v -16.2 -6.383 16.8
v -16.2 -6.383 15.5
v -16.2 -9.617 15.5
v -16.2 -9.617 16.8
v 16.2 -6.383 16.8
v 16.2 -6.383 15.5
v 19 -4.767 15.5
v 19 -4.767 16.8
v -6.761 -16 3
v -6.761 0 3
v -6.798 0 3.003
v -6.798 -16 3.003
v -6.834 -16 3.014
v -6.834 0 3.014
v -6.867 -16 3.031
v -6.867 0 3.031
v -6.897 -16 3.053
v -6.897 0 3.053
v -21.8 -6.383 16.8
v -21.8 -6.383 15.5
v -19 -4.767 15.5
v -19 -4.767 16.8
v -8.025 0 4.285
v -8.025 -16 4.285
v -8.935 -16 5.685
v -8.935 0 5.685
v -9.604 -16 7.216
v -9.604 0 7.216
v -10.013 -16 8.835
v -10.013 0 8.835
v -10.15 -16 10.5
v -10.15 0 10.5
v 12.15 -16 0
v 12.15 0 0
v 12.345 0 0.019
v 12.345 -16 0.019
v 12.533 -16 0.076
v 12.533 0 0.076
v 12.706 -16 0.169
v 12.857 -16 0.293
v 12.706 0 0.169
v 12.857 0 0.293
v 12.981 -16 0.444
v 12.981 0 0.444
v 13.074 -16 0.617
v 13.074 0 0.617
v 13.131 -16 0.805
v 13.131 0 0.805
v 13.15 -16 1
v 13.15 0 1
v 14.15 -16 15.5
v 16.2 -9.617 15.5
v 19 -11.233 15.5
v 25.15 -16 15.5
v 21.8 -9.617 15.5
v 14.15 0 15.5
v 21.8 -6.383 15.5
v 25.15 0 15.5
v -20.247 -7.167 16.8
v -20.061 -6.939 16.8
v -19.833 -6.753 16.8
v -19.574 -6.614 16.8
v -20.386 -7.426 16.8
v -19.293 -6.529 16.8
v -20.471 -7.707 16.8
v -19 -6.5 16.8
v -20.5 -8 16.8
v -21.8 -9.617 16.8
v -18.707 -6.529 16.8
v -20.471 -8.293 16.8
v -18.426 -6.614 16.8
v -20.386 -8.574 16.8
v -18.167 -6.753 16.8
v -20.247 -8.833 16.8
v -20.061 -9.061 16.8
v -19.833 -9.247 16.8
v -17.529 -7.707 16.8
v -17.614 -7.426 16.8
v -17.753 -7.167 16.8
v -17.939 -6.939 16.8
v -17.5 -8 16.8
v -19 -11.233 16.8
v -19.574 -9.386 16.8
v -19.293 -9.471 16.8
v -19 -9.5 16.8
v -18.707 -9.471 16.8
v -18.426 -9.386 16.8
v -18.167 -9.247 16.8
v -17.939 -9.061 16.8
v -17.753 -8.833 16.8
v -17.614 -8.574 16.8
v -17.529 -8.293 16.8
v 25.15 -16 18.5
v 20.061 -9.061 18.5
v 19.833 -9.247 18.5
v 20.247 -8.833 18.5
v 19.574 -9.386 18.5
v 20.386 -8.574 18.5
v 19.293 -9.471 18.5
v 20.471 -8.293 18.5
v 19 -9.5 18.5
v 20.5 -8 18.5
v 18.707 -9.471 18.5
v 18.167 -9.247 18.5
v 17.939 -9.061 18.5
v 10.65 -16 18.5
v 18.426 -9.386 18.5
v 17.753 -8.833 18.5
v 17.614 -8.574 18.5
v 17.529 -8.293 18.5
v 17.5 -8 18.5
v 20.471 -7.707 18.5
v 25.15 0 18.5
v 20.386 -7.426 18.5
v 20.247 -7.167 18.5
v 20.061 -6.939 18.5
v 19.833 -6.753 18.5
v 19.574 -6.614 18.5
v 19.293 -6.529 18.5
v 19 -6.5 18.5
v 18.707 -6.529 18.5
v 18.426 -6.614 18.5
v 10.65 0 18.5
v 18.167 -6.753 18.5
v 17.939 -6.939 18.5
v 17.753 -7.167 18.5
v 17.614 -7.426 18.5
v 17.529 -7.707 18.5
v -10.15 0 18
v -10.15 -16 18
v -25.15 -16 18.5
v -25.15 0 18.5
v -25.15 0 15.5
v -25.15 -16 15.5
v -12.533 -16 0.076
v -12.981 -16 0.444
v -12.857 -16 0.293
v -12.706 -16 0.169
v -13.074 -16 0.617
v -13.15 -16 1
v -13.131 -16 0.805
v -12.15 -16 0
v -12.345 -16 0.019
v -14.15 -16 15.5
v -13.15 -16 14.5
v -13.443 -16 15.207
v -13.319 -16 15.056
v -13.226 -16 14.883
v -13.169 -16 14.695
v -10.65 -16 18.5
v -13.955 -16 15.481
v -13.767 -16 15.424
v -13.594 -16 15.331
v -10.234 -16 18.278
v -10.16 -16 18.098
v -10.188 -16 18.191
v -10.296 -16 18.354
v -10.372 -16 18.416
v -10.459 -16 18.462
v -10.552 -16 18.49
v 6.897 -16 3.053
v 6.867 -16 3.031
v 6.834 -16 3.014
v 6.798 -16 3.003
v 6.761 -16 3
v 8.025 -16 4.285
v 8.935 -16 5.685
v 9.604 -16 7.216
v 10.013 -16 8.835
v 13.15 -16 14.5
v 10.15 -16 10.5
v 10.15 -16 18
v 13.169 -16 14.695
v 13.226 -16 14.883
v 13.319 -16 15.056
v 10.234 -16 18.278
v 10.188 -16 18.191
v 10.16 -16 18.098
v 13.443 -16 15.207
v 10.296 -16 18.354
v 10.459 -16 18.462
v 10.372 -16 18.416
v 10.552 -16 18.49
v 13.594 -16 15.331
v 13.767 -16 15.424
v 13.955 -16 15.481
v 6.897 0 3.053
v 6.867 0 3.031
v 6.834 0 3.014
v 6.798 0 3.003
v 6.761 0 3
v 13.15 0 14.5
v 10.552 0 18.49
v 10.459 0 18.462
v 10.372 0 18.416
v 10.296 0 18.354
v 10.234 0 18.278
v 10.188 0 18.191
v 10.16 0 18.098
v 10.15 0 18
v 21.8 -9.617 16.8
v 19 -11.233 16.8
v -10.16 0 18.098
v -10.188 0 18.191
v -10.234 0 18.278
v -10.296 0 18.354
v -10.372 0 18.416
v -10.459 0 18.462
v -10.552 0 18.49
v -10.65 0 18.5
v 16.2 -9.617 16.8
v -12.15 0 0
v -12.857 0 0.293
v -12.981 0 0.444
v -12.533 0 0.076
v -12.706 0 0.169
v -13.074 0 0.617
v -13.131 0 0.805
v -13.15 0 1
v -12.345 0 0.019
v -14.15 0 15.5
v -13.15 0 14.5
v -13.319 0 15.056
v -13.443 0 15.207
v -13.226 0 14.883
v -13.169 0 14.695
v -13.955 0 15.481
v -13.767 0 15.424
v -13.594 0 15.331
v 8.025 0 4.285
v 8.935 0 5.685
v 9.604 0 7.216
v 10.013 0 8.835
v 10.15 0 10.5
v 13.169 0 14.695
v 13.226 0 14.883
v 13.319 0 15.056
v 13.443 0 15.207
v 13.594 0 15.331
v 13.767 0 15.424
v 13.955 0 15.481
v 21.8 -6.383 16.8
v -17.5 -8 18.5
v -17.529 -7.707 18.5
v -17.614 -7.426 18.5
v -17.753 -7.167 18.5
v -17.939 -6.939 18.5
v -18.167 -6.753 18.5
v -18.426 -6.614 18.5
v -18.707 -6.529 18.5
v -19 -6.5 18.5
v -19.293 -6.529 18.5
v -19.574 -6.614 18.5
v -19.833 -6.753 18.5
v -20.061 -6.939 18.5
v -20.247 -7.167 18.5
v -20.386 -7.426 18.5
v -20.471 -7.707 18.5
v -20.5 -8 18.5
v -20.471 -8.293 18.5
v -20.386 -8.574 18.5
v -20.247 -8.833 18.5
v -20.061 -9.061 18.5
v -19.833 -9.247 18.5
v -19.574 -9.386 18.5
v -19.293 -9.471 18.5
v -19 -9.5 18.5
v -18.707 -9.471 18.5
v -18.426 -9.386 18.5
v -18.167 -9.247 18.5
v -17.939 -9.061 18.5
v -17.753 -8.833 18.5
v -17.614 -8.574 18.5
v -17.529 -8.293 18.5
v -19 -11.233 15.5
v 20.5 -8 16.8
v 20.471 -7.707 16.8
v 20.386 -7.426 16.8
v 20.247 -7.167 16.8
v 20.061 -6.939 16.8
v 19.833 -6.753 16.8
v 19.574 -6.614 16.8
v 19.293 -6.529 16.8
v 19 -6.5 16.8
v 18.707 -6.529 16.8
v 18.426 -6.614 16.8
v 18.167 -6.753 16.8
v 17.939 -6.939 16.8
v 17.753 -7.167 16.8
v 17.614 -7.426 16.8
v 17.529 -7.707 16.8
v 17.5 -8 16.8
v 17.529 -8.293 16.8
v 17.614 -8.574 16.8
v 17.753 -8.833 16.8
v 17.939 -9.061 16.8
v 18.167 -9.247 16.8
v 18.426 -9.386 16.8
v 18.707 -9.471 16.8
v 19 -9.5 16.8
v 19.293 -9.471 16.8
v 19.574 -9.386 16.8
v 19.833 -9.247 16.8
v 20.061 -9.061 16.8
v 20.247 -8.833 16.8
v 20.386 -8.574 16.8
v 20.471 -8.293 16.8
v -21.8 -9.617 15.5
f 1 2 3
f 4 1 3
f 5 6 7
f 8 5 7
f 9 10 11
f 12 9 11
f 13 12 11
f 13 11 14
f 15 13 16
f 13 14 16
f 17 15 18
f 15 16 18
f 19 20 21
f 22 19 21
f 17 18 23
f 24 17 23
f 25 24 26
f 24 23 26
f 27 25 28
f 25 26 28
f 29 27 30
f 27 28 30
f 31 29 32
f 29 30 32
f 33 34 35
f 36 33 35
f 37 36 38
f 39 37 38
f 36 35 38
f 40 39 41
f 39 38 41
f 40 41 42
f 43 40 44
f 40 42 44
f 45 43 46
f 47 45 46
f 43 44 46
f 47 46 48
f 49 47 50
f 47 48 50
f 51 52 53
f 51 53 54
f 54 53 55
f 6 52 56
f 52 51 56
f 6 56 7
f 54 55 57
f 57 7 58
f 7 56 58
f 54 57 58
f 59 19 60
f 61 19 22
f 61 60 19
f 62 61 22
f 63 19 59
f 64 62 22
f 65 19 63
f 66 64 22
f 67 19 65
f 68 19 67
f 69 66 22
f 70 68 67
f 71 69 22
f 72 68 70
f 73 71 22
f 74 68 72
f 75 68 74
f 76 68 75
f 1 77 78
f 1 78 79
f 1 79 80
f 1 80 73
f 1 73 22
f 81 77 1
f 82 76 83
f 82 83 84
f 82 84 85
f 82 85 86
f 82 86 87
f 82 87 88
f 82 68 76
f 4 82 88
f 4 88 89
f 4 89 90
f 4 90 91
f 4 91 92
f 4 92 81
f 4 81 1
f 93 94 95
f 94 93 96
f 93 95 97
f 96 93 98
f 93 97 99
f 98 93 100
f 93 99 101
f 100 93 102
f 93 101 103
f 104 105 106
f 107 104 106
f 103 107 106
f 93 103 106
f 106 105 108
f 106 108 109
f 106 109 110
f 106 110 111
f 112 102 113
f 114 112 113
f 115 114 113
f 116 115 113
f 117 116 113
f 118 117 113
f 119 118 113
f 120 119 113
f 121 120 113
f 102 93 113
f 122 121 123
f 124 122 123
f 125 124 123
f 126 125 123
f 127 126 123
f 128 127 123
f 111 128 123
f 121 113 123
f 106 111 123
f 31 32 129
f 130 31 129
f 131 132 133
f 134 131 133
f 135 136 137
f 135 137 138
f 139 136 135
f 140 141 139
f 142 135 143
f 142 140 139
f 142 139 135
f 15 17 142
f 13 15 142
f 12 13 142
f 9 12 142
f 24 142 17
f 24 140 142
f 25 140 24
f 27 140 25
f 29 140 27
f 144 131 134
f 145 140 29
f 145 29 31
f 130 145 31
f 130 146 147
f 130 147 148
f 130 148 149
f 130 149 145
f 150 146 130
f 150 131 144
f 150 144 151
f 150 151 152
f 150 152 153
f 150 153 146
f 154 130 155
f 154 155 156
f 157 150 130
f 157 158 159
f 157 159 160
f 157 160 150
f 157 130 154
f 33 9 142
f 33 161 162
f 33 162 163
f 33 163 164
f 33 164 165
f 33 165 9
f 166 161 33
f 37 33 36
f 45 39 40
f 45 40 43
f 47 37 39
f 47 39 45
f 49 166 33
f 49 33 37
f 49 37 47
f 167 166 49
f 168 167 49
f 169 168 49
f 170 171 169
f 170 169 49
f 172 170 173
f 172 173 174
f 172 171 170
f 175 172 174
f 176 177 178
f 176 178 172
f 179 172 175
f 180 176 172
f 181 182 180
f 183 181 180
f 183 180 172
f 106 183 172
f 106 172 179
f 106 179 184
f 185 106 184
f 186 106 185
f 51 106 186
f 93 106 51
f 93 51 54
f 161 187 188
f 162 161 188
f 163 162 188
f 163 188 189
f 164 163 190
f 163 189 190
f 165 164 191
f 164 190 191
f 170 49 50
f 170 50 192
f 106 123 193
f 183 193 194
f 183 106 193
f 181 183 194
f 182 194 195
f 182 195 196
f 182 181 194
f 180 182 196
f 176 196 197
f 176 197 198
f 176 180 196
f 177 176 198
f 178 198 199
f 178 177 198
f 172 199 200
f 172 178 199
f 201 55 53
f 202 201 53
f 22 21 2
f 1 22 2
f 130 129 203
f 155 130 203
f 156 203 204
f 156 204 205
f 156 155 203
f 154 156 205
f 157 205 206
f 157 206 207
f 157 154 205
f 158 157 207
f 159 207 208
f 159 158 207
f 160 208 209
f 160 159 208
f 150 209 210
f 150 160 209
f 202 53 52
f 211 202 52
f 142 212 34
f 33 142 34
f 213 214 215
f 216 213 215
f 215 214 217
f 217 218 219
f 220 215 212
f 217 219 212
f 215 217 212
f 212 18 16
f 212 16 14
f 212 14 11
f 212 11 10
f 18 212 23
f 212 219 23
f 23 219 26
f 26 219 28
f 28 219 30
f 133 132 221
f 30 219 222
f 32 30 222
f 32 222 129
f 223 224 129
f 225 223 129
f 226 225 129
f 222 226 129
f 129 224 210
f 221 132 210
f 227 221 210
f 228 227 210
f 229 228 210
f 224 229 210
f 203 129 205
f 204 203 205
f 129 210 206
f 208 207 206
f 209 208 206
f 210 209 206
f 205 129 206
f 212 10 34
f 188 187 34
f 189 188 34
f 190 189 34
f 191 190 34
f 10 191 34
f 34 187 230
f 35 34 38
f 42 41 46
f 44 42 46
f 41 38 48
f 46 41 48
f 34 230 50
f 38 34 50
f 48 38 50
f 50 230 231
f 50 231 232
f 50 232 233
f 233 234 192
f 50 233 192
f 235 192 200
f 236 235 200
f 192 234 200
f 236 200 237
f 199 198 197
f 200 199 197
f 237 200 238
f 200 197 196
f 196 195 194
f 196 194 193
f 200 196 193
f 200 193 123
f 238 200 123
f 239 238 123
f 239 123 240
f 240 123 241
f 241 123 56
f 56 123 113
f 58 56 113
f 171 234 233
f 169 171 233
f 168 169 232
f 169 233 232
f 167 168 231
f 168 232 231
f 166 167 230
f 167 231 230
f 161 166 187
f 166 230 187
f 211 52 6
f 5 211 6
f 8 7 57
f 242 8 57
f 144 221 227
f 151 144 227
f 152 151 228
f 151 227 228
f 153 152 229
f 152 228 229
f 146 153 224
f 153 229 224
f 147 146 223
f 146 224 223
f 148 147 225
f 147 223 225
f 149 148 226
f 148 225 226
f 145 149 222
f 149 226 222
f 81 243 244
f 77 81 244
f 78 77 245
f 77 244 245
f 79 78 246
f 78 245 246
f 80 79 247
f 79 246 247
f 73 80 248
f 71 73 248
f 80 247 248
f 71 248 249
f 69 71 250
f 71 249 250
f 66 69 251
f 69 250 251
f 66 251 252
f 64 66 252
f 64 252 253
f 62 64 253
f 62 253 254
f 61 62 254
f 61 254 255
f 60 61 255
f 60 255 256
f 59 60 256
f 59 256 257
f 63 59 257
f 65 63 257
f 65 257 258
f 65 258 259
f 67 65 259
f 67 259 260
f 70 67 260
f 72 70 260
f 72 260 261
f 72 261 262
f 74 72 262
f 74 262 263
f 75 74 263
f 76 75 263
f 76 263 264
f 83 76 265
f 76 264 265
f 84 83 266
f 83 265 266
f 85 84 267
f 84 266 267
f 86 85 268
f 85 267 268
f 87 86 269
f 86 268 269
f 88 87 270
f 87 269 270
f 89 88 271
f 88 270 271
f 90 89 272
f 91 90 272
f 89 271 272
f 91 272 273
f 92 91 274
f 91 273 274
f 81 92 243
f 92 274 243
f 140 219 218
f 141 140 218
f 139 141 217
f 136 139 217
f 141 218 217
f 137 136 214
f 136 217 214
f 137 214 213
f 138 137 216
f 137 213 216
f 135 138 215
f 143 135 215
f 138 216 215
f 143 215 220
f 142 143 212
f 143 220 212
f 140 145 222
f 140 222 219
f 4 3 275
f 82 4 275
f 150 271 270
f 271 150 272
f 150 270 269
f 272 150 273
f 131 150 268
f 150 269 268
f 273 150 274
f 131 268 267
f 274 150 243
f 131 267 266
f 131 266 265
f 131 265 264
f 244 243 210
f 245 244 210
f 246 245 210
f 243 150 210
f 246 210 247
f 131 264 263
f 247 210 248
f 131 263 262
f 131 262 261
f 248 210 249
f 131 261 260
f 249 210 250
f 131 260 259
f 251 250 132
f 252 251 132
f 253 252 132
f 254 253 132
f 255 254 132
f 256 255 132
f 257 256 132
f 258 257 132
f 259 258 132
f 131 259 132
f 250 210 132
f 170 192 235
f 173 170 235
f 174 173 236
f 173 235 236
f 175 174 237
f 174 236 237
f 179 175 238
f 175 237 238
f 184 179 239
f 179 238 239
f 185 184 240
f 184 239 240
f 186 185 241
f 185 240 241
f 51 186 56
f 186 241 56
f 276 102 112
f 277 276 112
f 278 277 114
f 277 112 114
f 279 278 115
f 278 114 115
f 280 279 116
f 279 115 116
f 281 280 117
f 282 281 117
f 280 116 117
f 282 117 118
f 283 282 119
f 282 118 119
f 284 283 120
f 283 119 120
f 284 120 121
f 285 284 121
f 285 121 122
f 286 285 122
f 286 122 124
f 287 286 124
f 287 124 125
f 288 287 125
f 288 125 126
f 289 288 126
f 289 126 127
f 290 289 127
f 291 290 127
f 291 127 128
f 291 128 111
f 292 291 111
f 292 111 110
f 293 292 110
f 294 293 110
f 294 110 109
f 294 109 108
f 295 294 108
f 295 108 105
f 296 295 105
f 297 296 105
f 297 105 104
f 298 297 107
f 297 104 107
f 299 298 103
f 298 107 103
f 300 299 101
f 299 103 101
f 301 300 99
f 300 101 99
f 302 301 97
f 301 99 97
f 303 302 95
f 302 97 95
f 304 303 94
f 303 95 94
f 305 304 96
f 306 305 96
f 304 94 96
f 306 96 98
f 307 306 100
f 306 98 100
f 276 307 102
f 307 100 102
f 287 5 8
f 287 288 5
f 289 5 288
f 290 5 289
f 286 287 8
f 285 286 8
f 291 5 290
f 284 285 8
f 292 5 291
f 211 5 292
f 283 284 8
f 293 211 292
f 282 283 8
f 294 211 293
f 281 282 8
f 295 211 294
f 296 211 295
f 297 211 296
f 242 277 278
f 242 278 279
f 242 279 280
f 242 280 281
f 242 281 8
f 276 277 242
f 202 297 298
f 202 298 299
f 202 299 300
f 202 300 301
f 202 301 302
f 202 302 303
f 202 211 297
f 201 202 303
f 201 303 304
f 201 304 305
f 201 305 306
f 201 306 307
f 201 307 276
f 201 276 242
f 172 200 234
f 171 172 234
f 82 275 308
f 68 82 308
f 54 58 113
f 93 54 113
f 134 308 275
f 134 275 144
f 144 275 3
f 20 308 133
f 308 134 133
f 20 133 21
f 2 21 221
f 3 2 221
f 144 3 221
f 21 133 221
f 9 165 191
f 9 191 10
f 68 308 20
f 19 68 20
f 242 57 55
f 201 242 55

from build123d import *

# Parameters (mm, degrees)
F1_DEPTH = 16
F2_R     = 1.5
F3_DEPTH = 18.501
F5_DEPTH = 1.3
F6_R     = 0.5


with BuildPart() as f1:
    # F0 (on Front) → F1 (new body)
    with BuildSketch(Plane.XZ):
        with BuildLine():
            ThreePointArc((-13.15, 1), (-12.857107, 0.292893), (-12.15, 0))
            Line((-12.15, 0), (12.15, 0))
            ThreePointArc((12.15, 0), (12.857107, 0.292893), (13.15, 1))
            Line((13.15, 1), (13.15, 14.5))
            ThreePointArc((13.15, 14.5), (13.442893, 15.207107), (14.15, 15.5))
            Line((14.15, 15.5), (25.15, 15.5))
            Line((25.15, 15.5), (25.15, 18.5))
            Line((25.15, 18.5), (13.15, 18.5))
            Line((13.15, 18.5), (10.15, 18.5))
            Line((10.15, 18.5), (10.15, 10.5))
            ThreePointArc((10.15, 10.5), (9.301266, 6.436878), (6.897004, 3.053266))
            ThreePointArc((6.897004, 3.053266), (6.834086, 3.013792), (6.761102, 3))
            Line((6.761102, 3), (-6.761102, 3))
            ThreePointArc((-6.761102, 3), (-6.834086, 3.013792), (-6.897004, 3.053266))
            ThreePointArc((-6.897004, 3.053266), (-9.301266, 6.436878), (-10.15, 10.5))
            Line((-10.15, 10.5), (-10.15, 18.5))
            Line((-10.15, 18.5), (-13.15, 18.5))
            Line((-13.15, 18.5), (-25.15, 18.5))
            Line((-25.15, 18.5), (-25.15, 15.5))
            Line((-25.15, 15.5), (-14.15, 15.5))
            ThreePointArc((-14.15, 15.5), (-13.442893, 15.207107), (-13.15, 14.5))
            Line((-13.15, 14.5), (-13.15, 1))
        make_face()
    extrude(amount=F1_DEPTH)

    # F2 (on face) → F3 (cut, through all)
    with BuildSketch(Plane.XY.offset(18.5)):
        with Locations((-19, -8)):
            Circle(F2_R)
        with Locations((19, -8)):
            Circle(F2_R)
    extrude(amount=-F3_DEPTH, mode=Mode.SUBTRACT)

    # F4 (on face) → F5 (cut)
    with BuildSketch(Plane(origin=(0, 0, 15.5), x_dir=(1, 0, 0), z_dir=(0, 0, -1))):
        Polygon((-16.2, 6.383419), (-16.2, 9.616581), (-19, 11.233162), (-21.8, 9.616581), (-21.8, 6.383419), (-19, 4.766838), align=None)
        Polygon((19, 11.233162), (16.2, 9.616581), (16.2, 6.383419), (19, 4.766838), (21.8, 6.383419), (21.8, 9.616581), align=None)
    extrude(amount=-F5_DEPTH, mode=Mode.SUBTRACT)

    # F6
    f6_edges = [f1.edges().sort_by_distance(p)[0] for p in [
        (-10.15, -8, 18.5),
        (10.15, -8, 18.5),
    ]]
    fillet(f6_edges, radius=F6_R)


solid = f1.part
